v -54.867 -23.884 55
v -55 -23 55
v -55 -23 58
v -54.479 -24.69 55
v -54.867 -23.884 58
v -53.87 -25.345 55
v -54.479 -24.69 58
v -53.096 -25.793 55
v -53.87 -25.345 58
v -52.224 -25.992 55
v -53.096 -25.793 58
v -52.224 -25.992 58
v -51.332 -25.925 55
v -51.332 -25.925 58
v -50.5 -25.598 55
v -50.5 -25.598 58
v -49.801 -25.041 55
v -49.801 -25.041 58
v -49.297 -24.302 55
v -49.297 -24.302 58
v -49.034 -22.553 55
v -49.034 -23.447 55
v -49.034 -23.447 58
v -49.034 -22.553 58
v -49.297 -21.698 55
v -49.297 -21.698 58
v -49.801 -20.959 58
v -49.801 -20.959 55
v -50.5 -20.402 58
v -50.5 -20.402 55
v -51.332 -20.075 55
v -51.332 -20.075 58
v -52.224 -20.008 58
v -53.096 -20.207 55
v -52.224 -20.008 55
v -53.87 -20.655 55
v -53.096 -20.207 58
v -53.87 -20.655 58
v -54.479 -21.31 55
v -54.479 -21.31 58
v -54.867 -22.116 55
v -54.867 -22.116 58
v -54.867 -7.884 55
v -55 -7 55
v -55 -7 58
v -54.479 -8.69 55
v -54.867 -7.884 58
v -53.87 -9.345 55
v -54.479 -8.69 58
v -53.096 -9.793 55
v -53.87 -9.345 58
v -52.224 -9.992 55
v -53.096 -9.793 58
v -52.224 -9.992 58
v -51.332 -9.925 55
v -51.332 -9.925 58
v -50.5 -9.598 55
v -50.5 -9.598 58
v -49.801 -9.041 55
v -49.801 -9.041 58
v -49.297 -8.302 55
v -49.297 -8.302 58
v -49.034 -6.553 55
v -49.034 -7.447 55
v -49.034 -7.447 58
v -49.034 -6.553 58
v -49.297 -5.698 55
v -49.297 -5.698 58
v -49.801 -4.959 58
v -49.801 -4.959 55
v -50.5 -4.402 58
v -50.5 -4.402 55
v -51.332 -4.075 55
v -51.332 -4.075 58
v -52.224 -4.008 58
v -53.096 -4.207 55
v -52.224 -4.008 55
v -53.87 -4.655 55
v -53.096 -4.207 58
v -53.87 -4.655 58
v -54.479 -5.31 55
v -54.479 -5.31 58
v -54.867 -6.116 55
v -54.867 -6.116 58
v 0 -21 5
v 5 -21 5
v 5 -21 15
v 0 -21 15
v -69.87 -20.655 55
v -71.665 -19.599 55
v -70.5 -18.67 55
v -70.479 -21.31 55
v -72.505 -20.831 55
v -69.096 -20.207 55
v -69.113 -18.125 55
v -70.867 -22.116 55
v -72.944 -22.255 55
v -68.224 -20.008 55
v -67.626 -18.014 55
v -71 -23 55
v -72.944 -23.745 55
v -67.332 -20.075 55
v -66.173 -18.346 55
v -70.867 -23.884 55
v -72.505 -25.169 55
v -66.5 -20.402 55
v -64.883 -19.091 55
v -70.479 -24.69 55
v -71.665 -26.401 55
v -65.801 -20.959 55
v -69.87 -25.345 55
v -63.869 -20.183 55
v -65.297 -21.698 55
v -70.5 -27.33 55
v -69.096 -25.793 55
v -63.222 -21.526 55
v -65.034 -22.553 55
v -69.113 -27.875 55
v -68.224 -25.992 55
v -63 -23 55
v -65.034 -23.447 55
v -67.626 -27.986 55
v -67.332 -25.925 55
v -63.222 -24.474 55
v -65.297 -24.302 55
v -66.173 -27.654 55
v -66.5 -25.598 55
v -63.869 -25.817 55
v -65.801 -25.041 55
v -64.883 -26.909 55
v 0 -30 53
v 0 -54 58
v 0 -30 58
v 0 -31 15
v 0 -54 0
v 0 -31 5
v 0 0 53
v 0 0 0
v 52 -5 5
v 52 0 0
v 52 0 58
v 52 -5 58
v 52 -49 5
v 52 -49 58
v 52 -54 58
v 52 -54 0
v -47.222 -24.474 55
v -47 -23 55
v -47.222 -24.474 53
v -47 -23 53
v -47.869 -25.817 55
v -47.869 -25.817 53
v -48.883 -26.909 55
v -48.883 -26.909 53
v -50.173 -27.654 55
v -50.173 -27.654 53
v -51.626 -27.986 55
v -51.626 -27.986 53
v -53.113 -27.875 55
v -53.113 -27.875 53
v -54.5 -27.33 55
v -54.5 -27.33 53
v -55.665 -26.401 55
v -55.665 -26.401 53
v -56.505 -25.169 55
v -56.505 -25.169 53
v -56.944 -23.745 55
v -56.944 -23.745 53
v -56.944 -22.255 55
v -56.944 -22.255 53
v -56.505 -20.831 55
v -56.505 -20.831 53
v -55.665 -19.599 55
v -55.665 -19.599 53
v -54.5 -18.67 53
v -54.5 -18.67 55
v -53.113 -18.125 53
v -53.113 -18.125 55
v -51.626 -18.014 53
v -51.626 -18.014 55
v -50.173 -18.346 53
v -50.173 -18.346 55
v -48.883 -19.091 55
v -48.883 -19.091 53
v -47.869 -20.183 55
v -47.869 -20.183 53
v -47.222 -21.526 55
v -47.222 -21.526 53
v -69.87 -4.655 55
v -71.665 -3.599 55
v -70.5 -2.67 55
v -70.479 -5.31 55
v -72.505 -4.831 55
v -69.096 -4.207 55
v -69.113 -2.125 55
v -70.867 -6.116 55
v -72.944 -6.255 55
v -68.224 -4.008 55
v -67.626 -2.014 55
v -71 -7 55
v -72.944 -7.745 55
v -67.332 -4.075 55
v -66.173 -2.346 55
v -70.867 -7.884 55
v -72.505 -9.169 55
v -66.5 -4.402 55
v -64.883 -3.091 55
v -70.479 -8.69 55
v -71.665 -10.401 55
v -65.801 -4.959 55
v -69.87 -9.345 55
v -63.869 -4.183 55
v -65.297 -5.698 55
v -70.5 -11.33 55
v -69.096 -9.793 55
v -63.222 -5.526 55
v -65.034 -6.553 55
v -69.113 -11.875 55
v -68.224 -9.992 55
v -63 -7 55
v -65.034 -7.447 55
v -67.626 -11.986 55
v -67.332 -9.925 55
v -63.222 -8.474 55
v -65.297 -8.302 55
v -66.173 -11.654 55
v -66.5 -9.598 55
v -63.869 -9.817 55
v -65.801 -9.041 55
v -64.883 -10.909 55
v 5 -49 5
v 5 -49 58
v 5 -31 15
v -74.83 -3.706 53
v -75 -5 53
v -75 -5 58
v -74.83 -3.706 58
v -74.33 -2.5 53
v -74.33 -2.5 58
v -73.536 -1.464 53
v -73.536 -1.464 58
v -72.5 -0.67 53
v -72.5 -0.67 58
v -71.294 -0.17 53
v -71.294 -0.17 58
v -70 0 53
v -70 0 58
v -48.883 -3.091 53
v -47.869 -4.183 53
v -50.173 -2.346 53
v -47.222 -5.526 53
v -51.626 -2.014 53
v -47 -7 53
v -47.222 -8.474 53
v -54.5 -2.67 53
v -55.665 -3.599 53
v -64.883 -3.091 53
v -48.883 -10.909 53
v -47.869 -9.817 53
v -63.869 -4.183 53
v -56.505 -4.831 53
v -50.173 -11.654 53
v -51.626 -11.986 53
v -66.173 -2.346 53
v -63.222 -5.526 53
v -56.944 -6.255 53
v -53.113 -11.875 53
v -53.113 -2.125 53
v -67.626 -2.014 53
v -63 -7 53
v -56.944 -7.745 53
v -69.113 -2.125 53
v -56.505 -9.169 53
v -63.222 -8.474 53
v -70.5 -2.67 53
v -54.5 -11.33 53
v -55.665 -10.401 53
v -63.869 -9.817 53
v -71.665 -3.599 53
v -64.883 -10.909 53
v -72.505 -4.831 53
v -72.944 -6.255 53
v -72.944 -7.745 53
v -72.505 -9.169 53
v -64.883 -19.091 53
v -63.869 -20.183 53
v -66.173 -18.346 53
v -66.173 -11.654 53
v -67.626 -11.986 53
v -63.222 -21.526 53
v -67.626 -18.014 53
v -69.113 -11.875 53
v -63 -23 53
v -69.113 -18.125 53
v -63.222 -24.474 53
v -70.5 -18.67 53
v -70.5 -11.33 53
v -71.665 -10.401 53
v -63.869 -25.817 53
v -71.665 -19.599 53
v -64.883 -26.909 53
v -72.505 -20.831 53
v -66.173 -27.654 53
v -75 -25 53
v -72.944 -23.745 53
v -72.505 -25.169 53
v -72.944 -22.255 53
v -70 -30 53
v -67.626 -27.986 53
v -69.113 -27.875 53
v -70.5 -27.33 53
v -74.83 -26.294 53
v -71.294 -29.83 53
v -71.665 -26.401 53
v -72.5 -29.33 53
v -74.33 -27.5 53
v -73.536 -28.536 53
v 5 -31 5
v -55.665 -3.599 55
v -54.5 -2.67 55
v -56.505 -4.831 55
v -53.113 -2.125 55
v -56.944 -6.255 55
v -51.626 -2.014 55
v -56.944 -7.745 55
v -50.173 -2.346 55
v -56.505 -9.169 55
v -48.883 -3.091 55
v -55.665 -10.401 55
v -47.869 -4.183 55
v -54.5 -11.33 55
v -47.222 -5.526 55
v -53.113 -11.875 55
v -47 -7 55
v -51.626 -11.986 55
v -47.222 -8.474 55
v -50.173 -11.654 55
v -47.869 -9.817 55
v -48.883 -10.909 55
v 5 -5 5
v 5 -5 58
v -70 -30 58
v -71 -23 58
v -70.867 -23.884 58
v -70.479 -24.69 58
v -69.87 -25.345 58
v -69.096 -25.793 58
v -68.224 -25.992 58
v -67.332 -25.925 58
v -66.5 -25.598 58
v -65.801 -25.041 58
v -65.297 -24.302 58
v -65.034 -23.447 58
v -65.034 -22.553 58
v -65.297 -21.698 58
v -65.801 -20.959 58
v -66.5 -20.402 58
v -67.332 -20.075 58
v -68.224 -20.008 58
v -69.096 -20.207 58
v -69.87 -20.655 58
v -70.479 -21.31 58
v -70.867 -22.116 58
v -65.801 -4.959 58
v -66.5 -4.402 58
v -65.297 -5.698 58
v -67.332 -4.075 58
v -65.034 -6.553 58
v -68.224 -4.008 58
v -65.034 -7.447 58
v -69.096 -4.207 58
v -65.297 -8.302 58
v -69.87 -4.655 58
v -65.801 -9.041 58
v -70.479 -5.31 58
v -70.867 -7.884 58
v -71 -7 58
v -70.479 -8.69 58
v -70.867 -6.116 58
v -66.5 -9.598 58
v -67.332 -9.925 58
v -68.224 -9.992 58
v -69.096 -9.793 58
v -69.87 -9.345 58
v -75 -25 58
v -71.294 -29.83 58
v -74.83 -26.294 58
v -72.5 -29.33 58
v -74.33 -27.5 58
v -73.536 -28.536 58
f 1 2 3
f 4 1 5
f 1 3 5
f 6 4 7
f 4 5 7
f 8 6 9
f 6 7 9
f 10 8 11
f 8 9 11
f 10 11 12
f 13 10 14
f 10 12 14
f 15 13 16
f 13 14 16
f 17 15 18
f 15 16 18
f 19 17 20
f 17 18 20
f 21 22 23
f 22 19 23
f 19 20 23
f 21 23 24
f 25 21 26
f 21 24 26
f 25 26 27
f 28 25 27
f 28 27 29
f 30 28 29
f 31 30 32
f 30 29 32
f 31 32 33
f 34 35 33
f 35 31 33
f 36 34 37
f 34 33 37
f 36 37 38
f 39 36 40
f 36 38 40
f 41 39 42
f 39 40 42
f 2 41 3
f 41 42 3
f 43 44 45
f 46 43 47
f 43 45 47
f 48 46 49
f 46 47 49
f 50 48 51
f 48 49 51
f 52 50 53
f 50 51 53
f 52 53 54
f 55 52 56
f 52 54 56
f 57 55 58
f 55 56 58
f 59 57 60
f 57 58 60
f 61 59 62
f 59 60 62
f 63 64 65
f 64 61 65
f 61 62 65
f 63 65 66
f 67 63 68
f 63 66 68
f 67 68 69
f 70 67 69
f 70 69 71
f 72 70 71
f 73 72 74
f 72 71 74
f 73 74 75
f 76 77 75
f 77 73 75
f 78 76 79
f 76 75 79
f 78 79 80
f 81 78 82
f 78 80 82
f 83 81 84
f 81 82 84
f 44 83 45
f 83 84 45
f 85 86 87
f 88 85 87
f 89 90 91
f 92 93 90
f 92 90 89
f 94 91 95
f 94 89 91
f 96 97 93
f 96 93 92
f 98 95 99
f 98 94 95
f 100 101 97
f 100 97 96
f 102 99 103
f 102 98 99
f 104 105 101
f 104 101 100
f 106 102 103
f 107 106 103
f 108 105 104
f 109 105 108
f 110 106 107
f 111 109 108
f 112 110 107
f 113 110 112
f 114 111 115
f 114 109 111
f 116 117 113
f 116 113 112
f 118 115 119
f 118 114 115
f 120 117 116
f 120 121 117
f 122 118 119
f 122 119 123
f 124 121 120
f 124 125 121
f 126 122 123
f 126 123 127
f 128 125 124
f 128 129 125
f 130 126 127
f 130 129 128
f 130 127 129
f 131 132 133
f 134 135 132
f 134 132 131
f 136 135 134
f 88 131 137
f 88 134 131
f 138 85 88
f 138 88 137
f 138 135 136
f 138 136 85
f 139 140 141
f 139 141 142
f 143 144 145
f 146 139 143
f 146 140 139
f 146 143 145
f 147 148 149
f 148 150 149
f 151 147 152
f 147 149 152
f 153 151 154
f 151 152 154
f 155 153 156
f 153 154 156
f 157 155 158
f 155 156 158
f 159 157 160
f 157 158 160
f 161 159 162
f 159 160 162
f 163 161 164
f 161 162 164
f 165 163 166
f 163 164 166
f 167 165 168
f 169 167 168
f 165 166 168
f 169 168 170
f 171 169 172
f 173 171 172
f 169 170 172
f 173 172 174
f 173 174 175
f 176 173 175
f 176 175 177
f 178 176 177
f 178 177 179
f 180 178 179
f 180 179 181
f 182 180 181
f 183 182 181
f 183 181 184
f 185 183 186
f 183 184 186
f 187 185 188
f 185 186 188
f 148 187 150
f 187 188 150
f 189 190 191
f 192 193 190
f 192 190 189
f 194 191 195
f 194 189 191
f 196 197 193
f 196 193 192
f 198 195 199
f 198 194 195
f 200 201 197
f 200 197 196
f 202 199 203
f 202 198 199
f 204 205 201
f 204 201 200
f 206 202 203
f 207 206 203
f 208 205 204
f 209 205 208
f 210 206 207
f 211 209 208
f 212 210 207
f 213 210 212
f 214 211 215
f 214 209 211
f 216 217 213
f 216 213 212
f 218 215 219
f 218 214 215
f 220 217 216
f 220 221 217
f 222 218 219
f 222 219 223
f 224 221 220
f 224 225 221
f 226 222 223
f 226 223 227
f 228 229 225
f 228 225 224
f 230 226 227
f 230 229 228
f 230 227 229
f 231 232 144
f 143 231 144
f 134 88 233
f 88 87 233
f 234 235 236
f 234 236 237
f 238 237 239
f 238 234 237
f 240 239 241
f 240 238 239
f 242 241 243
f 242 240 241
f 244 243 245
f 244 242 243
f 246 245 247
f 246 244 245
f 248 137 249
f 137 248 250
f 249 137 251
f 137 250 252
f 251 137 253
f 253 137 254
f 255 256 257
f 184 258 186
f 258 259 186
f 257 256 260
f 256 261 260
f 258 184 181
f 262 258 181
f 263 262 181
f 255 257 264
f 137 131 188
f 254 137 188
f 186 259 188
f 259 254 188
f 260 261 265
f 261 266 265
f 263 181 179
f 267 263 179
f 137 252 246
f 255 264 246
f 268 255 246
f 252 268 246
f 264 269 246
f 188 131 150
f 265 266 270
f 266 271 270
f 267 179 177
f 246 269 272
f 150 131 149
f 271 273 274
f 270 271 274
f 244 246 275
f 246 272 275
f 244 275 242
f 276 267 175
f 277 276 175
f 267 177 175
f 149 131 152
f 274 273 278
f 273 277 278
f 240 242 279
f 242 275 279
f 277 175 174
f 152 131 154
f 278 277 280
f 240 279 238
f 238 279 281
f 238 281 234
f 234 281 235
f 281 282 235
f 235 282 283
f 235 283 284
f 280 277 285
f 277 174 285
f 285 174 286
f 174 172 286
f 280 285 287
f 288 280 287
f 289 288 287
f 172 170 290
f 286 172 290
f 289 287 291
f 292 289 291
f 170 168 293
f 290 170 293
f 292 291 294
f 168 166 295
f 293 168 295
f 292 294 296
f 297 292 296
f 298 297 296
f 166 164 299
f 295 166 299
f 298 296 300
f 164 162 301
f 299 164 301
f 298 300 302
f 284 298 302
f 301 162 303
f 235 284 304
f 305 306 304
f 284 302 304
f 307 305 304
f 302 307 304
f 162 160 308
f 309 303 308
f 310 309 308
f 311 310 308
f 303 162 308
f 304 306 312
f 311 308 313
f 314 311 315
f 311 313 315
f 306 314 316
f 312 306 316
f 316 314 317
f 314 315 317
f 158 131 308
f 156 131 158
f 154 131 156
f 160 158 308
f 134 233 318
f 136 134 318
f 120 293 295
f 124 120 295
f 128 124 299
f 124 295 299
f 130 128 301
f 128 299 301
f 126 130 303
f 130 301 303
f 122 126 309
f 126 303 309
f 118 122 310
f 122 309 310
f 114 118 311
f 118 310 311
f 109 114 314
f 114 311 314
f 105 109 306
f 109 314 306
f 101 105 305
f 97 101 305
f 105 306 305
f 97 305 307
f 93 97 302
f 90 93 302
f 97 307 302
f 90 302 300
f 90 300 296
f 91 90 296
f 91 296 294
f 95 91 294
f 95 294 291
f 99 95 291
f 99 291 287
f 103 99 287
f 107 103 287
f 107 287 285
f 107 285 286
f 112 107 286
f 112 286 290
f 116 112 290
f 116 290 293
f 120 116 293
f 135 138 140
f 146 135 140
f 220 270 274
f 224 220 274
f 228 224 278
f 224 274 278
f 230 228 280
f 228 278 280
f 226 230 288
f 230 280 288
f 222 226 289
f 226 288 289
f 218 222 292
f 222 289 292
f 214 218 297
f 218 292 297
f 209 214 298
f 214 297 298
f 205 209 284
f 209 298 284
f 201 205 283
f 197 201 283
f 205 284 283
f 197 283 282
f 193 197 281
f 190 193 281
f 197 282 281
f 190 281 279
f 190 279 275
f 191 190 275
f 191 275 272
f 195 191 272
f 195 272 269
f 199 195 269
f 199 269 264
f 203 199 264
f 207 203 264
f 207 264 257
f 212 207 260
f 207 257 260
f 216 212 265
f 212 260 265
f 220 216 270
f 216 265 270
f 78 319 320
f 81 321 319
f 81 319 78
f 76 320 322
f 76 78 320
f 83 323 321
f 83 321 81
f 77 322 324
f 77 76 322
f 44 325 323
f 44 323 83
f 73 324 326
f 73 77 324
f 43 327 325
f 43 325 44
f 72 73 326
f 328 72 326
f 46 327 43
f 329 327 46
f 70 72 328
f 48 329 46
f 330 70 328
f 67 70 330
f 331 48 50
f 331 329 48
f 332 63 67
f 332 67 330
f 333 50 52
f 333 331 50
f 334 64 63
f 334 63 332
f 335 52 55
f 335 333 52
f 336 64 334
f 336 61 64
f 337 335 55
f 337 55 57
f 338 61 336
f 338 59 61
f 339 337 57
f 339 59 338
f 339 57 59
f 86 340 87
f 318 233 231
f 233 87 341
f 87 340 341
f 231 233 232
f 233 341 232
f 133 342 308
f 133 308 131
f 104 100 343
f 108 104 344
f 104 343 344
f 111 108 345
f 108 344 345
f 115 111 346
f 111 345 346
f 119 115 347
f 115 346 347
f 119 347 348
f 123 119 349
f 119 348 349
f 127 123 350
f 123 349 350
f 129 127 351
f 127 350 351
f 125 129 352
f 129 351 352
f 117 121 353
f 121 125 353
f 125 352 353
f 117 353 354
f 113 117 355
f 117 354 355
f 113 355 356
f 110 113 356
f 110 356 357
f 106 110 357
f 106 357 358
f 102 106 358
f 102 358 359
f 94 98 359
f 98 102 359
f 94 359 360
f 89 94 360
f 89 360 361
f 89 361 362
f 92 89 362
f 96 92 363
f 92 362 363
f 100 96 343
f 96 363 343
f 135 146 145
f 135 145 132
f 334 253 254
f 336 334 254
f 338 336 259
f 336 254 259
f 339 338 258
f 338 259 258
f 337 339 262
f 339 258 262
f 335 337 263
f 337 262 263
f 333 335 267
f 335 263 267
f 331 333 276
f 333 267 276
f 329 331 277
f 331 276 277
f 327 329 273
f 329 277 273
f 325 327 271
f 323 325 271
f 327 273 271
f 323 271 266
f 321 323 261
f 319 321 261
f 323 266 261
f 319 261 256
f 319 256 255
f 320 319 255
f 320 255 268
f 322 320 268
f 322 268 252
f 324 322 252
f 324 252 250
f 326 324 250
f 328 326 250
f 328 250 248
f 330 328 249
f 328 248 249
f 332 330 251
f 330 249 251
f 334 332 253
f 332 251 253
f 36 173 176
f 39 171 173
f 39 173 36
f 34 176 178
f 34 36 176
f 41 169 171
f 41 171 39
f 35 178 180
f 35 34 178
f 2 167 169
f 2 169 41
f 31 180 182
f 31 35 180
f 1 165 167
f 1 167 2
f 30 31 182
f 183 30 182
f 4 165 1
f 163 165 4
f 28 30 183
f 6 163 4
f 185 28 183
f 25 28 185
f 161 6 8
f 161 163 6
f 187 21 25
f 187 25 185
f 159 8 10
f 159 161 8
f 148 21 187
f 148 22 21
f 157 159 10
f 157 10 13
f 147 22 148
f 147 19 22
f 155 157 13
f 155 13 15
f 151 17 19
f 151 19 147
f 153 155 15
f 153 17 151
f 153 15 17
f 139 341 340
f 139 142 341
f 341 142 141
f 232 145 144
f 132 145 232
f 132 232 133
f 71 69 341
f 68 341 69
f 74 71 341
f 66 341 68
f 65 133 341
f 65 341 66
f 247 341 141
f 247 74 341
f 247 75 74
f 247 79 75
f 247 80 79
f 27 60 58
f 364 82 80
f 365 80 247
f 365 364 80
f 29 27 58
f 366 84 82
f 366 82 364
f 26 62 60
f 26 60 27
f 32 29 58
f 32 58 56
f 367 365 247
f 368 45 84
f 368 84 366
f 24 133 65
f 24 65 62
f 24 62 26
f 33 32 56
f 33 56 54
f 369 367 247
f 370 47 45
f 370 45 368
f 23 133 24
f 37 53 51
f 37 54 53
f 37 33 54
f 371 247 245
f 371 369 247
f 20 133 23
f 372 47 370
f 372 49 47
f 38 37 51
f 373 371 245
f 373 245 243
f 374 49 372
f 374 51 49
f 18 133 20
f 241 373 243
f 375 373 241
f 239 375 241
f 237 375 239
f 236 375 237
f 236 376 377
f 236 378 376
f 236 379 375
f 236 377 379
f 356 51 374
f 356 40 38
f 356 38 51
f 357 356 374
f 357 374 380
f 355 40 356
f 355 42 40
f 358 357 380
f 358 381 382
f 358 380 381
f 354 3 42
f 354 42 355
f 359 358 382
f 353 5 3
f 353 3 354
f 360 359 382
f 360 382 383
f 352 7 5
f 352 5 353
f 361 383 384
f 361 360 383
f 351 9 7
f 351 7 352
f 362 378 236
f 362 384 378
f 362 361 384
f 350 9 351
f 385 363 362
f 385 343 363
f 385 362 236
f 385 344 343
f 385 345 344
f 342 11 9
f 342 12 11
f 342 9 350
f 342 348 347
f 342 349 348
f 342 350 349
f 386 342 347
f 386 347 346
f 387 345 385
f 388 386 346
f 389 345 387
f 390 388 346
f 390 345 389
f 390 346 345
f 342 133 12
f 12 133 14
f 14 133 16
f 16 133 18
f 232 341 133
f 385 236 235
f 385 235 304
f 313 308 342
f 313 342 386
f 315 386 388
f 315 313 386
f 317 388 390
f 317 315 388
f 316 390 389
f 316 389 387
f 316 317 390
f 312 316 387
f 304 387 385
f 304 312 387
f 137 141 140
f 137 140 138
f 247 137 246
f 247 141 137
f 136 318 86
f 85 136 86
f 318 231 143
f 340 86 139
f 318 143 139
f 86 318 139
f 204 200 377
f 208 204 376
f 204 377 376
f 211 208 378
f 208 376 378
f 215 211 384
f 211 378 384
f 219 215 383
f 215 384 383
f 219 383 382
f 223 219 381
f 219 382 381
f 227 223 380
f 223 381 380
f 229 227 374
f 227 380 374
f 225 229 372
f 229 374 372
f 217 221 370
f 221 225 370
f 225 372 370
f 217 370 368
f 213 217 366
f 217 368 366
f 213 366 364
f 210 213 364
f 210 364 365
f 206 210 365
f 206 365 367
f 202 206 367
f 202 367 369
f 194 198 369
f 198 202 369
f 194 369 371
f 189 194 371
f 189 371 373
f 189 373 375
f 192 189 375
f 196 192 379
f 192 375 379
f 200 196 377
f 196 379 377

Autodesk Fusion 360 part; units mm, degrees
sketch "Sketch1" plane through (0, 0, 0) normal (0, 0, 1) x (1, 0, 0)
  line L0 (0, 0) -> (52, 0)
  line L1 (52, 0) -> (52, -54)
  line L2 (52, -54) -> (0, -54)
  line L3 (0, -54) -> (0, 0)
  dimension "d1" = 52
  dimension "d2" = 54
extrude "Extrude1" add sketch "Sketch1" along normal blind 58
sketch "Sketch2" plane through (52, 0, 0) normal (1, 0, 0) x (0, 1, 0)
  line L0 (-54, 0) -> (0, 0)
  line L1 (0, 0) -> (0, 58)
  line L2 (0, 58) -> (-54, 58)
  line L3 (-54, 58) -> (-54, 0)
  line L4 (-5, 5) -> (-49, 5)
  line L5 (-49, 5) -> (-49, 53)
  line L6 (-49, 53) -> (-5, 53)
  line L7 (-5, 53) -> (-5, 5)
  dimension "d5" = 44
  dimension "d6" = 48
extrude "Extrude2" cut sketch "Sketch2" against normal blind 47 contours L4 L5 L6 L7
sketch "Sketch3" plane through (0, 0, 58) normal (0, 0, 1) x (-1, 0, 0)
  line L0 (0, 54) -> (-52, 54)
  line L1 (-52, 54) -> (-52, 0)
  line L2 (-52, 0) -> (0, 0)
  line L3 (0, 0) -> (0, 54)
  line L4 (-52, 5) -> (-5, 5)
  line L5 (-5, 5) -> (-5, 49)
  line L6 (-5, 49) -> (-52, 49)
  line L7 (-52, 49) -> (-52, 5)
  dimension "d9" = 47
  dimension "d10" = 44
extrude "Extrude3" cut sketch "Sketch3" against normal blind 6 contours L1 L4 L5 L6 L7
sketch "Sketch4" plane through (0, 0, 58) normal (0, 0, 1) x (-1, 0, 0)
  line L0 (-5, 5) -> (-52, 5)
  line L1 (-52, 5) -> (-52, 0)
  line L2 (-52, 0) -> (0, 0)
  line L3 (0, 0) -> (0, 54)
  line L4 (0, 54) -> (-52, 54)
  line L5 (0, 0) -> (75, 0)
  line L6 (75, 0) -> (75, 30)
  line L7 (75, 30) -> (0, 30)
  line L8 (0, 30) -> (0, 0)
  line L9 (-52, 54) -> (-52, 49)
  line L10 (-52, 49) -> (-5, 49)
  line L11 (-5, 49) -> (-5, 5)
  dimension "d13" = 75
  dimension "d14" = 30
extrude "Extrude4" add sketch "Sketch4" against normal blind 5 contours L3 L5 L6 L7 L8
sketch "Sketch5" plane through (0, 0, 58) normal (0, 0, 1) x (-1, 0, 0)
  line L0 (-5, 5) -> (-52, 5)
  line L1 (-52, 5) -> (-52, 0)
  line L2 (-52, 0) -> (75, 0)
  line L3 (75, 0) -> (75, 30)
  line L4 (75, 30) -> (0, 30)
  circle A0 centre (68, 7) radius 3
  circle A1 centre (68, 23) radius 3
  circle A2 centre (52, 7) radius 3
  circle A3 centre (52, 23) radius 3
  line L5 (0, 30) -> (0, 54)
  line L6 (0, 54) -> (-52, 54)
  line L7 (-52, 54) -> (-52, 49)
  line L8 (-52, 49) -> (-5, 49)
  line L9 (-5, 49) -> (-5, 5)
  dimension "d17" = 6
  dimension "d18" = 6
  dimension "d19" = 6
  dimension "d20" = 6
extrude "Extrude5" cut sketch "Sketch5" against normal blind 5 contours A0 | A1 | A2 | A3
sketch "Sketch6" plane through (0, 0, 53) normal (0, 0, -1) x (1, 0, 0)
  circle A0 centre (-68, 23) radius 3
  circle A1 centre (-68, 7) radius 3
  circle A2 centre (-52, 23) radius 3
  circle A3 centre (-52, 7) radius 3
  line L0 (0, 0) -> (0, 30)
  line L1 (0, 30) -> (-75, 30)
  line L2 (-75, 30) -> (-75, 0)
  line L3 (-75, 0) -> (0, 0)
  circle A4 centre (-68, 23) radius 5
  circle A5 centre (-52, 23) radius 5
  circle A6 centre (-68, 7) radius 5
  circle A7 centre (-52, 7) radius 5
  dimension "d23" = 10
  dimension "d24" = 10
  dimension "d25" = 10
  dimension "d26" = 10
extrude "Extrude6" cut sketch "Sketch6" against normal blind 2 contours A4 | A5 | A6 | A7
fillet "Fillet1" radius 5 2 edges at (-75, -30, 55.5) (-75, 0, 55.5)
sketch "Sketch7" plane through (5, 0, 0) normal (1, 0, 0) x (0, 1, 0)
  line L0 (-49, 58) -> (-49, 5)
  line L1 (-49, 5) -> (-5, 5)
  line L2 (-5, 5) -> (-5, 58)
  line L3 (-5, 58) -> (-49, 58)
  line L4 (-31, 5) -> (-21, 5)
  line L5 (-21, 5) -> (-21, 15)
  line L6 (-21, 15) -> (-31, 15)
  line L7 (-31, 15) -> (-31, 5)
  dimension "d31" = 10
  dimension "d32" = 10
extrude "Extrude7" cut sketch "Sketch7" against normal blind 15 contours L1 L4 L5 L6 L7
